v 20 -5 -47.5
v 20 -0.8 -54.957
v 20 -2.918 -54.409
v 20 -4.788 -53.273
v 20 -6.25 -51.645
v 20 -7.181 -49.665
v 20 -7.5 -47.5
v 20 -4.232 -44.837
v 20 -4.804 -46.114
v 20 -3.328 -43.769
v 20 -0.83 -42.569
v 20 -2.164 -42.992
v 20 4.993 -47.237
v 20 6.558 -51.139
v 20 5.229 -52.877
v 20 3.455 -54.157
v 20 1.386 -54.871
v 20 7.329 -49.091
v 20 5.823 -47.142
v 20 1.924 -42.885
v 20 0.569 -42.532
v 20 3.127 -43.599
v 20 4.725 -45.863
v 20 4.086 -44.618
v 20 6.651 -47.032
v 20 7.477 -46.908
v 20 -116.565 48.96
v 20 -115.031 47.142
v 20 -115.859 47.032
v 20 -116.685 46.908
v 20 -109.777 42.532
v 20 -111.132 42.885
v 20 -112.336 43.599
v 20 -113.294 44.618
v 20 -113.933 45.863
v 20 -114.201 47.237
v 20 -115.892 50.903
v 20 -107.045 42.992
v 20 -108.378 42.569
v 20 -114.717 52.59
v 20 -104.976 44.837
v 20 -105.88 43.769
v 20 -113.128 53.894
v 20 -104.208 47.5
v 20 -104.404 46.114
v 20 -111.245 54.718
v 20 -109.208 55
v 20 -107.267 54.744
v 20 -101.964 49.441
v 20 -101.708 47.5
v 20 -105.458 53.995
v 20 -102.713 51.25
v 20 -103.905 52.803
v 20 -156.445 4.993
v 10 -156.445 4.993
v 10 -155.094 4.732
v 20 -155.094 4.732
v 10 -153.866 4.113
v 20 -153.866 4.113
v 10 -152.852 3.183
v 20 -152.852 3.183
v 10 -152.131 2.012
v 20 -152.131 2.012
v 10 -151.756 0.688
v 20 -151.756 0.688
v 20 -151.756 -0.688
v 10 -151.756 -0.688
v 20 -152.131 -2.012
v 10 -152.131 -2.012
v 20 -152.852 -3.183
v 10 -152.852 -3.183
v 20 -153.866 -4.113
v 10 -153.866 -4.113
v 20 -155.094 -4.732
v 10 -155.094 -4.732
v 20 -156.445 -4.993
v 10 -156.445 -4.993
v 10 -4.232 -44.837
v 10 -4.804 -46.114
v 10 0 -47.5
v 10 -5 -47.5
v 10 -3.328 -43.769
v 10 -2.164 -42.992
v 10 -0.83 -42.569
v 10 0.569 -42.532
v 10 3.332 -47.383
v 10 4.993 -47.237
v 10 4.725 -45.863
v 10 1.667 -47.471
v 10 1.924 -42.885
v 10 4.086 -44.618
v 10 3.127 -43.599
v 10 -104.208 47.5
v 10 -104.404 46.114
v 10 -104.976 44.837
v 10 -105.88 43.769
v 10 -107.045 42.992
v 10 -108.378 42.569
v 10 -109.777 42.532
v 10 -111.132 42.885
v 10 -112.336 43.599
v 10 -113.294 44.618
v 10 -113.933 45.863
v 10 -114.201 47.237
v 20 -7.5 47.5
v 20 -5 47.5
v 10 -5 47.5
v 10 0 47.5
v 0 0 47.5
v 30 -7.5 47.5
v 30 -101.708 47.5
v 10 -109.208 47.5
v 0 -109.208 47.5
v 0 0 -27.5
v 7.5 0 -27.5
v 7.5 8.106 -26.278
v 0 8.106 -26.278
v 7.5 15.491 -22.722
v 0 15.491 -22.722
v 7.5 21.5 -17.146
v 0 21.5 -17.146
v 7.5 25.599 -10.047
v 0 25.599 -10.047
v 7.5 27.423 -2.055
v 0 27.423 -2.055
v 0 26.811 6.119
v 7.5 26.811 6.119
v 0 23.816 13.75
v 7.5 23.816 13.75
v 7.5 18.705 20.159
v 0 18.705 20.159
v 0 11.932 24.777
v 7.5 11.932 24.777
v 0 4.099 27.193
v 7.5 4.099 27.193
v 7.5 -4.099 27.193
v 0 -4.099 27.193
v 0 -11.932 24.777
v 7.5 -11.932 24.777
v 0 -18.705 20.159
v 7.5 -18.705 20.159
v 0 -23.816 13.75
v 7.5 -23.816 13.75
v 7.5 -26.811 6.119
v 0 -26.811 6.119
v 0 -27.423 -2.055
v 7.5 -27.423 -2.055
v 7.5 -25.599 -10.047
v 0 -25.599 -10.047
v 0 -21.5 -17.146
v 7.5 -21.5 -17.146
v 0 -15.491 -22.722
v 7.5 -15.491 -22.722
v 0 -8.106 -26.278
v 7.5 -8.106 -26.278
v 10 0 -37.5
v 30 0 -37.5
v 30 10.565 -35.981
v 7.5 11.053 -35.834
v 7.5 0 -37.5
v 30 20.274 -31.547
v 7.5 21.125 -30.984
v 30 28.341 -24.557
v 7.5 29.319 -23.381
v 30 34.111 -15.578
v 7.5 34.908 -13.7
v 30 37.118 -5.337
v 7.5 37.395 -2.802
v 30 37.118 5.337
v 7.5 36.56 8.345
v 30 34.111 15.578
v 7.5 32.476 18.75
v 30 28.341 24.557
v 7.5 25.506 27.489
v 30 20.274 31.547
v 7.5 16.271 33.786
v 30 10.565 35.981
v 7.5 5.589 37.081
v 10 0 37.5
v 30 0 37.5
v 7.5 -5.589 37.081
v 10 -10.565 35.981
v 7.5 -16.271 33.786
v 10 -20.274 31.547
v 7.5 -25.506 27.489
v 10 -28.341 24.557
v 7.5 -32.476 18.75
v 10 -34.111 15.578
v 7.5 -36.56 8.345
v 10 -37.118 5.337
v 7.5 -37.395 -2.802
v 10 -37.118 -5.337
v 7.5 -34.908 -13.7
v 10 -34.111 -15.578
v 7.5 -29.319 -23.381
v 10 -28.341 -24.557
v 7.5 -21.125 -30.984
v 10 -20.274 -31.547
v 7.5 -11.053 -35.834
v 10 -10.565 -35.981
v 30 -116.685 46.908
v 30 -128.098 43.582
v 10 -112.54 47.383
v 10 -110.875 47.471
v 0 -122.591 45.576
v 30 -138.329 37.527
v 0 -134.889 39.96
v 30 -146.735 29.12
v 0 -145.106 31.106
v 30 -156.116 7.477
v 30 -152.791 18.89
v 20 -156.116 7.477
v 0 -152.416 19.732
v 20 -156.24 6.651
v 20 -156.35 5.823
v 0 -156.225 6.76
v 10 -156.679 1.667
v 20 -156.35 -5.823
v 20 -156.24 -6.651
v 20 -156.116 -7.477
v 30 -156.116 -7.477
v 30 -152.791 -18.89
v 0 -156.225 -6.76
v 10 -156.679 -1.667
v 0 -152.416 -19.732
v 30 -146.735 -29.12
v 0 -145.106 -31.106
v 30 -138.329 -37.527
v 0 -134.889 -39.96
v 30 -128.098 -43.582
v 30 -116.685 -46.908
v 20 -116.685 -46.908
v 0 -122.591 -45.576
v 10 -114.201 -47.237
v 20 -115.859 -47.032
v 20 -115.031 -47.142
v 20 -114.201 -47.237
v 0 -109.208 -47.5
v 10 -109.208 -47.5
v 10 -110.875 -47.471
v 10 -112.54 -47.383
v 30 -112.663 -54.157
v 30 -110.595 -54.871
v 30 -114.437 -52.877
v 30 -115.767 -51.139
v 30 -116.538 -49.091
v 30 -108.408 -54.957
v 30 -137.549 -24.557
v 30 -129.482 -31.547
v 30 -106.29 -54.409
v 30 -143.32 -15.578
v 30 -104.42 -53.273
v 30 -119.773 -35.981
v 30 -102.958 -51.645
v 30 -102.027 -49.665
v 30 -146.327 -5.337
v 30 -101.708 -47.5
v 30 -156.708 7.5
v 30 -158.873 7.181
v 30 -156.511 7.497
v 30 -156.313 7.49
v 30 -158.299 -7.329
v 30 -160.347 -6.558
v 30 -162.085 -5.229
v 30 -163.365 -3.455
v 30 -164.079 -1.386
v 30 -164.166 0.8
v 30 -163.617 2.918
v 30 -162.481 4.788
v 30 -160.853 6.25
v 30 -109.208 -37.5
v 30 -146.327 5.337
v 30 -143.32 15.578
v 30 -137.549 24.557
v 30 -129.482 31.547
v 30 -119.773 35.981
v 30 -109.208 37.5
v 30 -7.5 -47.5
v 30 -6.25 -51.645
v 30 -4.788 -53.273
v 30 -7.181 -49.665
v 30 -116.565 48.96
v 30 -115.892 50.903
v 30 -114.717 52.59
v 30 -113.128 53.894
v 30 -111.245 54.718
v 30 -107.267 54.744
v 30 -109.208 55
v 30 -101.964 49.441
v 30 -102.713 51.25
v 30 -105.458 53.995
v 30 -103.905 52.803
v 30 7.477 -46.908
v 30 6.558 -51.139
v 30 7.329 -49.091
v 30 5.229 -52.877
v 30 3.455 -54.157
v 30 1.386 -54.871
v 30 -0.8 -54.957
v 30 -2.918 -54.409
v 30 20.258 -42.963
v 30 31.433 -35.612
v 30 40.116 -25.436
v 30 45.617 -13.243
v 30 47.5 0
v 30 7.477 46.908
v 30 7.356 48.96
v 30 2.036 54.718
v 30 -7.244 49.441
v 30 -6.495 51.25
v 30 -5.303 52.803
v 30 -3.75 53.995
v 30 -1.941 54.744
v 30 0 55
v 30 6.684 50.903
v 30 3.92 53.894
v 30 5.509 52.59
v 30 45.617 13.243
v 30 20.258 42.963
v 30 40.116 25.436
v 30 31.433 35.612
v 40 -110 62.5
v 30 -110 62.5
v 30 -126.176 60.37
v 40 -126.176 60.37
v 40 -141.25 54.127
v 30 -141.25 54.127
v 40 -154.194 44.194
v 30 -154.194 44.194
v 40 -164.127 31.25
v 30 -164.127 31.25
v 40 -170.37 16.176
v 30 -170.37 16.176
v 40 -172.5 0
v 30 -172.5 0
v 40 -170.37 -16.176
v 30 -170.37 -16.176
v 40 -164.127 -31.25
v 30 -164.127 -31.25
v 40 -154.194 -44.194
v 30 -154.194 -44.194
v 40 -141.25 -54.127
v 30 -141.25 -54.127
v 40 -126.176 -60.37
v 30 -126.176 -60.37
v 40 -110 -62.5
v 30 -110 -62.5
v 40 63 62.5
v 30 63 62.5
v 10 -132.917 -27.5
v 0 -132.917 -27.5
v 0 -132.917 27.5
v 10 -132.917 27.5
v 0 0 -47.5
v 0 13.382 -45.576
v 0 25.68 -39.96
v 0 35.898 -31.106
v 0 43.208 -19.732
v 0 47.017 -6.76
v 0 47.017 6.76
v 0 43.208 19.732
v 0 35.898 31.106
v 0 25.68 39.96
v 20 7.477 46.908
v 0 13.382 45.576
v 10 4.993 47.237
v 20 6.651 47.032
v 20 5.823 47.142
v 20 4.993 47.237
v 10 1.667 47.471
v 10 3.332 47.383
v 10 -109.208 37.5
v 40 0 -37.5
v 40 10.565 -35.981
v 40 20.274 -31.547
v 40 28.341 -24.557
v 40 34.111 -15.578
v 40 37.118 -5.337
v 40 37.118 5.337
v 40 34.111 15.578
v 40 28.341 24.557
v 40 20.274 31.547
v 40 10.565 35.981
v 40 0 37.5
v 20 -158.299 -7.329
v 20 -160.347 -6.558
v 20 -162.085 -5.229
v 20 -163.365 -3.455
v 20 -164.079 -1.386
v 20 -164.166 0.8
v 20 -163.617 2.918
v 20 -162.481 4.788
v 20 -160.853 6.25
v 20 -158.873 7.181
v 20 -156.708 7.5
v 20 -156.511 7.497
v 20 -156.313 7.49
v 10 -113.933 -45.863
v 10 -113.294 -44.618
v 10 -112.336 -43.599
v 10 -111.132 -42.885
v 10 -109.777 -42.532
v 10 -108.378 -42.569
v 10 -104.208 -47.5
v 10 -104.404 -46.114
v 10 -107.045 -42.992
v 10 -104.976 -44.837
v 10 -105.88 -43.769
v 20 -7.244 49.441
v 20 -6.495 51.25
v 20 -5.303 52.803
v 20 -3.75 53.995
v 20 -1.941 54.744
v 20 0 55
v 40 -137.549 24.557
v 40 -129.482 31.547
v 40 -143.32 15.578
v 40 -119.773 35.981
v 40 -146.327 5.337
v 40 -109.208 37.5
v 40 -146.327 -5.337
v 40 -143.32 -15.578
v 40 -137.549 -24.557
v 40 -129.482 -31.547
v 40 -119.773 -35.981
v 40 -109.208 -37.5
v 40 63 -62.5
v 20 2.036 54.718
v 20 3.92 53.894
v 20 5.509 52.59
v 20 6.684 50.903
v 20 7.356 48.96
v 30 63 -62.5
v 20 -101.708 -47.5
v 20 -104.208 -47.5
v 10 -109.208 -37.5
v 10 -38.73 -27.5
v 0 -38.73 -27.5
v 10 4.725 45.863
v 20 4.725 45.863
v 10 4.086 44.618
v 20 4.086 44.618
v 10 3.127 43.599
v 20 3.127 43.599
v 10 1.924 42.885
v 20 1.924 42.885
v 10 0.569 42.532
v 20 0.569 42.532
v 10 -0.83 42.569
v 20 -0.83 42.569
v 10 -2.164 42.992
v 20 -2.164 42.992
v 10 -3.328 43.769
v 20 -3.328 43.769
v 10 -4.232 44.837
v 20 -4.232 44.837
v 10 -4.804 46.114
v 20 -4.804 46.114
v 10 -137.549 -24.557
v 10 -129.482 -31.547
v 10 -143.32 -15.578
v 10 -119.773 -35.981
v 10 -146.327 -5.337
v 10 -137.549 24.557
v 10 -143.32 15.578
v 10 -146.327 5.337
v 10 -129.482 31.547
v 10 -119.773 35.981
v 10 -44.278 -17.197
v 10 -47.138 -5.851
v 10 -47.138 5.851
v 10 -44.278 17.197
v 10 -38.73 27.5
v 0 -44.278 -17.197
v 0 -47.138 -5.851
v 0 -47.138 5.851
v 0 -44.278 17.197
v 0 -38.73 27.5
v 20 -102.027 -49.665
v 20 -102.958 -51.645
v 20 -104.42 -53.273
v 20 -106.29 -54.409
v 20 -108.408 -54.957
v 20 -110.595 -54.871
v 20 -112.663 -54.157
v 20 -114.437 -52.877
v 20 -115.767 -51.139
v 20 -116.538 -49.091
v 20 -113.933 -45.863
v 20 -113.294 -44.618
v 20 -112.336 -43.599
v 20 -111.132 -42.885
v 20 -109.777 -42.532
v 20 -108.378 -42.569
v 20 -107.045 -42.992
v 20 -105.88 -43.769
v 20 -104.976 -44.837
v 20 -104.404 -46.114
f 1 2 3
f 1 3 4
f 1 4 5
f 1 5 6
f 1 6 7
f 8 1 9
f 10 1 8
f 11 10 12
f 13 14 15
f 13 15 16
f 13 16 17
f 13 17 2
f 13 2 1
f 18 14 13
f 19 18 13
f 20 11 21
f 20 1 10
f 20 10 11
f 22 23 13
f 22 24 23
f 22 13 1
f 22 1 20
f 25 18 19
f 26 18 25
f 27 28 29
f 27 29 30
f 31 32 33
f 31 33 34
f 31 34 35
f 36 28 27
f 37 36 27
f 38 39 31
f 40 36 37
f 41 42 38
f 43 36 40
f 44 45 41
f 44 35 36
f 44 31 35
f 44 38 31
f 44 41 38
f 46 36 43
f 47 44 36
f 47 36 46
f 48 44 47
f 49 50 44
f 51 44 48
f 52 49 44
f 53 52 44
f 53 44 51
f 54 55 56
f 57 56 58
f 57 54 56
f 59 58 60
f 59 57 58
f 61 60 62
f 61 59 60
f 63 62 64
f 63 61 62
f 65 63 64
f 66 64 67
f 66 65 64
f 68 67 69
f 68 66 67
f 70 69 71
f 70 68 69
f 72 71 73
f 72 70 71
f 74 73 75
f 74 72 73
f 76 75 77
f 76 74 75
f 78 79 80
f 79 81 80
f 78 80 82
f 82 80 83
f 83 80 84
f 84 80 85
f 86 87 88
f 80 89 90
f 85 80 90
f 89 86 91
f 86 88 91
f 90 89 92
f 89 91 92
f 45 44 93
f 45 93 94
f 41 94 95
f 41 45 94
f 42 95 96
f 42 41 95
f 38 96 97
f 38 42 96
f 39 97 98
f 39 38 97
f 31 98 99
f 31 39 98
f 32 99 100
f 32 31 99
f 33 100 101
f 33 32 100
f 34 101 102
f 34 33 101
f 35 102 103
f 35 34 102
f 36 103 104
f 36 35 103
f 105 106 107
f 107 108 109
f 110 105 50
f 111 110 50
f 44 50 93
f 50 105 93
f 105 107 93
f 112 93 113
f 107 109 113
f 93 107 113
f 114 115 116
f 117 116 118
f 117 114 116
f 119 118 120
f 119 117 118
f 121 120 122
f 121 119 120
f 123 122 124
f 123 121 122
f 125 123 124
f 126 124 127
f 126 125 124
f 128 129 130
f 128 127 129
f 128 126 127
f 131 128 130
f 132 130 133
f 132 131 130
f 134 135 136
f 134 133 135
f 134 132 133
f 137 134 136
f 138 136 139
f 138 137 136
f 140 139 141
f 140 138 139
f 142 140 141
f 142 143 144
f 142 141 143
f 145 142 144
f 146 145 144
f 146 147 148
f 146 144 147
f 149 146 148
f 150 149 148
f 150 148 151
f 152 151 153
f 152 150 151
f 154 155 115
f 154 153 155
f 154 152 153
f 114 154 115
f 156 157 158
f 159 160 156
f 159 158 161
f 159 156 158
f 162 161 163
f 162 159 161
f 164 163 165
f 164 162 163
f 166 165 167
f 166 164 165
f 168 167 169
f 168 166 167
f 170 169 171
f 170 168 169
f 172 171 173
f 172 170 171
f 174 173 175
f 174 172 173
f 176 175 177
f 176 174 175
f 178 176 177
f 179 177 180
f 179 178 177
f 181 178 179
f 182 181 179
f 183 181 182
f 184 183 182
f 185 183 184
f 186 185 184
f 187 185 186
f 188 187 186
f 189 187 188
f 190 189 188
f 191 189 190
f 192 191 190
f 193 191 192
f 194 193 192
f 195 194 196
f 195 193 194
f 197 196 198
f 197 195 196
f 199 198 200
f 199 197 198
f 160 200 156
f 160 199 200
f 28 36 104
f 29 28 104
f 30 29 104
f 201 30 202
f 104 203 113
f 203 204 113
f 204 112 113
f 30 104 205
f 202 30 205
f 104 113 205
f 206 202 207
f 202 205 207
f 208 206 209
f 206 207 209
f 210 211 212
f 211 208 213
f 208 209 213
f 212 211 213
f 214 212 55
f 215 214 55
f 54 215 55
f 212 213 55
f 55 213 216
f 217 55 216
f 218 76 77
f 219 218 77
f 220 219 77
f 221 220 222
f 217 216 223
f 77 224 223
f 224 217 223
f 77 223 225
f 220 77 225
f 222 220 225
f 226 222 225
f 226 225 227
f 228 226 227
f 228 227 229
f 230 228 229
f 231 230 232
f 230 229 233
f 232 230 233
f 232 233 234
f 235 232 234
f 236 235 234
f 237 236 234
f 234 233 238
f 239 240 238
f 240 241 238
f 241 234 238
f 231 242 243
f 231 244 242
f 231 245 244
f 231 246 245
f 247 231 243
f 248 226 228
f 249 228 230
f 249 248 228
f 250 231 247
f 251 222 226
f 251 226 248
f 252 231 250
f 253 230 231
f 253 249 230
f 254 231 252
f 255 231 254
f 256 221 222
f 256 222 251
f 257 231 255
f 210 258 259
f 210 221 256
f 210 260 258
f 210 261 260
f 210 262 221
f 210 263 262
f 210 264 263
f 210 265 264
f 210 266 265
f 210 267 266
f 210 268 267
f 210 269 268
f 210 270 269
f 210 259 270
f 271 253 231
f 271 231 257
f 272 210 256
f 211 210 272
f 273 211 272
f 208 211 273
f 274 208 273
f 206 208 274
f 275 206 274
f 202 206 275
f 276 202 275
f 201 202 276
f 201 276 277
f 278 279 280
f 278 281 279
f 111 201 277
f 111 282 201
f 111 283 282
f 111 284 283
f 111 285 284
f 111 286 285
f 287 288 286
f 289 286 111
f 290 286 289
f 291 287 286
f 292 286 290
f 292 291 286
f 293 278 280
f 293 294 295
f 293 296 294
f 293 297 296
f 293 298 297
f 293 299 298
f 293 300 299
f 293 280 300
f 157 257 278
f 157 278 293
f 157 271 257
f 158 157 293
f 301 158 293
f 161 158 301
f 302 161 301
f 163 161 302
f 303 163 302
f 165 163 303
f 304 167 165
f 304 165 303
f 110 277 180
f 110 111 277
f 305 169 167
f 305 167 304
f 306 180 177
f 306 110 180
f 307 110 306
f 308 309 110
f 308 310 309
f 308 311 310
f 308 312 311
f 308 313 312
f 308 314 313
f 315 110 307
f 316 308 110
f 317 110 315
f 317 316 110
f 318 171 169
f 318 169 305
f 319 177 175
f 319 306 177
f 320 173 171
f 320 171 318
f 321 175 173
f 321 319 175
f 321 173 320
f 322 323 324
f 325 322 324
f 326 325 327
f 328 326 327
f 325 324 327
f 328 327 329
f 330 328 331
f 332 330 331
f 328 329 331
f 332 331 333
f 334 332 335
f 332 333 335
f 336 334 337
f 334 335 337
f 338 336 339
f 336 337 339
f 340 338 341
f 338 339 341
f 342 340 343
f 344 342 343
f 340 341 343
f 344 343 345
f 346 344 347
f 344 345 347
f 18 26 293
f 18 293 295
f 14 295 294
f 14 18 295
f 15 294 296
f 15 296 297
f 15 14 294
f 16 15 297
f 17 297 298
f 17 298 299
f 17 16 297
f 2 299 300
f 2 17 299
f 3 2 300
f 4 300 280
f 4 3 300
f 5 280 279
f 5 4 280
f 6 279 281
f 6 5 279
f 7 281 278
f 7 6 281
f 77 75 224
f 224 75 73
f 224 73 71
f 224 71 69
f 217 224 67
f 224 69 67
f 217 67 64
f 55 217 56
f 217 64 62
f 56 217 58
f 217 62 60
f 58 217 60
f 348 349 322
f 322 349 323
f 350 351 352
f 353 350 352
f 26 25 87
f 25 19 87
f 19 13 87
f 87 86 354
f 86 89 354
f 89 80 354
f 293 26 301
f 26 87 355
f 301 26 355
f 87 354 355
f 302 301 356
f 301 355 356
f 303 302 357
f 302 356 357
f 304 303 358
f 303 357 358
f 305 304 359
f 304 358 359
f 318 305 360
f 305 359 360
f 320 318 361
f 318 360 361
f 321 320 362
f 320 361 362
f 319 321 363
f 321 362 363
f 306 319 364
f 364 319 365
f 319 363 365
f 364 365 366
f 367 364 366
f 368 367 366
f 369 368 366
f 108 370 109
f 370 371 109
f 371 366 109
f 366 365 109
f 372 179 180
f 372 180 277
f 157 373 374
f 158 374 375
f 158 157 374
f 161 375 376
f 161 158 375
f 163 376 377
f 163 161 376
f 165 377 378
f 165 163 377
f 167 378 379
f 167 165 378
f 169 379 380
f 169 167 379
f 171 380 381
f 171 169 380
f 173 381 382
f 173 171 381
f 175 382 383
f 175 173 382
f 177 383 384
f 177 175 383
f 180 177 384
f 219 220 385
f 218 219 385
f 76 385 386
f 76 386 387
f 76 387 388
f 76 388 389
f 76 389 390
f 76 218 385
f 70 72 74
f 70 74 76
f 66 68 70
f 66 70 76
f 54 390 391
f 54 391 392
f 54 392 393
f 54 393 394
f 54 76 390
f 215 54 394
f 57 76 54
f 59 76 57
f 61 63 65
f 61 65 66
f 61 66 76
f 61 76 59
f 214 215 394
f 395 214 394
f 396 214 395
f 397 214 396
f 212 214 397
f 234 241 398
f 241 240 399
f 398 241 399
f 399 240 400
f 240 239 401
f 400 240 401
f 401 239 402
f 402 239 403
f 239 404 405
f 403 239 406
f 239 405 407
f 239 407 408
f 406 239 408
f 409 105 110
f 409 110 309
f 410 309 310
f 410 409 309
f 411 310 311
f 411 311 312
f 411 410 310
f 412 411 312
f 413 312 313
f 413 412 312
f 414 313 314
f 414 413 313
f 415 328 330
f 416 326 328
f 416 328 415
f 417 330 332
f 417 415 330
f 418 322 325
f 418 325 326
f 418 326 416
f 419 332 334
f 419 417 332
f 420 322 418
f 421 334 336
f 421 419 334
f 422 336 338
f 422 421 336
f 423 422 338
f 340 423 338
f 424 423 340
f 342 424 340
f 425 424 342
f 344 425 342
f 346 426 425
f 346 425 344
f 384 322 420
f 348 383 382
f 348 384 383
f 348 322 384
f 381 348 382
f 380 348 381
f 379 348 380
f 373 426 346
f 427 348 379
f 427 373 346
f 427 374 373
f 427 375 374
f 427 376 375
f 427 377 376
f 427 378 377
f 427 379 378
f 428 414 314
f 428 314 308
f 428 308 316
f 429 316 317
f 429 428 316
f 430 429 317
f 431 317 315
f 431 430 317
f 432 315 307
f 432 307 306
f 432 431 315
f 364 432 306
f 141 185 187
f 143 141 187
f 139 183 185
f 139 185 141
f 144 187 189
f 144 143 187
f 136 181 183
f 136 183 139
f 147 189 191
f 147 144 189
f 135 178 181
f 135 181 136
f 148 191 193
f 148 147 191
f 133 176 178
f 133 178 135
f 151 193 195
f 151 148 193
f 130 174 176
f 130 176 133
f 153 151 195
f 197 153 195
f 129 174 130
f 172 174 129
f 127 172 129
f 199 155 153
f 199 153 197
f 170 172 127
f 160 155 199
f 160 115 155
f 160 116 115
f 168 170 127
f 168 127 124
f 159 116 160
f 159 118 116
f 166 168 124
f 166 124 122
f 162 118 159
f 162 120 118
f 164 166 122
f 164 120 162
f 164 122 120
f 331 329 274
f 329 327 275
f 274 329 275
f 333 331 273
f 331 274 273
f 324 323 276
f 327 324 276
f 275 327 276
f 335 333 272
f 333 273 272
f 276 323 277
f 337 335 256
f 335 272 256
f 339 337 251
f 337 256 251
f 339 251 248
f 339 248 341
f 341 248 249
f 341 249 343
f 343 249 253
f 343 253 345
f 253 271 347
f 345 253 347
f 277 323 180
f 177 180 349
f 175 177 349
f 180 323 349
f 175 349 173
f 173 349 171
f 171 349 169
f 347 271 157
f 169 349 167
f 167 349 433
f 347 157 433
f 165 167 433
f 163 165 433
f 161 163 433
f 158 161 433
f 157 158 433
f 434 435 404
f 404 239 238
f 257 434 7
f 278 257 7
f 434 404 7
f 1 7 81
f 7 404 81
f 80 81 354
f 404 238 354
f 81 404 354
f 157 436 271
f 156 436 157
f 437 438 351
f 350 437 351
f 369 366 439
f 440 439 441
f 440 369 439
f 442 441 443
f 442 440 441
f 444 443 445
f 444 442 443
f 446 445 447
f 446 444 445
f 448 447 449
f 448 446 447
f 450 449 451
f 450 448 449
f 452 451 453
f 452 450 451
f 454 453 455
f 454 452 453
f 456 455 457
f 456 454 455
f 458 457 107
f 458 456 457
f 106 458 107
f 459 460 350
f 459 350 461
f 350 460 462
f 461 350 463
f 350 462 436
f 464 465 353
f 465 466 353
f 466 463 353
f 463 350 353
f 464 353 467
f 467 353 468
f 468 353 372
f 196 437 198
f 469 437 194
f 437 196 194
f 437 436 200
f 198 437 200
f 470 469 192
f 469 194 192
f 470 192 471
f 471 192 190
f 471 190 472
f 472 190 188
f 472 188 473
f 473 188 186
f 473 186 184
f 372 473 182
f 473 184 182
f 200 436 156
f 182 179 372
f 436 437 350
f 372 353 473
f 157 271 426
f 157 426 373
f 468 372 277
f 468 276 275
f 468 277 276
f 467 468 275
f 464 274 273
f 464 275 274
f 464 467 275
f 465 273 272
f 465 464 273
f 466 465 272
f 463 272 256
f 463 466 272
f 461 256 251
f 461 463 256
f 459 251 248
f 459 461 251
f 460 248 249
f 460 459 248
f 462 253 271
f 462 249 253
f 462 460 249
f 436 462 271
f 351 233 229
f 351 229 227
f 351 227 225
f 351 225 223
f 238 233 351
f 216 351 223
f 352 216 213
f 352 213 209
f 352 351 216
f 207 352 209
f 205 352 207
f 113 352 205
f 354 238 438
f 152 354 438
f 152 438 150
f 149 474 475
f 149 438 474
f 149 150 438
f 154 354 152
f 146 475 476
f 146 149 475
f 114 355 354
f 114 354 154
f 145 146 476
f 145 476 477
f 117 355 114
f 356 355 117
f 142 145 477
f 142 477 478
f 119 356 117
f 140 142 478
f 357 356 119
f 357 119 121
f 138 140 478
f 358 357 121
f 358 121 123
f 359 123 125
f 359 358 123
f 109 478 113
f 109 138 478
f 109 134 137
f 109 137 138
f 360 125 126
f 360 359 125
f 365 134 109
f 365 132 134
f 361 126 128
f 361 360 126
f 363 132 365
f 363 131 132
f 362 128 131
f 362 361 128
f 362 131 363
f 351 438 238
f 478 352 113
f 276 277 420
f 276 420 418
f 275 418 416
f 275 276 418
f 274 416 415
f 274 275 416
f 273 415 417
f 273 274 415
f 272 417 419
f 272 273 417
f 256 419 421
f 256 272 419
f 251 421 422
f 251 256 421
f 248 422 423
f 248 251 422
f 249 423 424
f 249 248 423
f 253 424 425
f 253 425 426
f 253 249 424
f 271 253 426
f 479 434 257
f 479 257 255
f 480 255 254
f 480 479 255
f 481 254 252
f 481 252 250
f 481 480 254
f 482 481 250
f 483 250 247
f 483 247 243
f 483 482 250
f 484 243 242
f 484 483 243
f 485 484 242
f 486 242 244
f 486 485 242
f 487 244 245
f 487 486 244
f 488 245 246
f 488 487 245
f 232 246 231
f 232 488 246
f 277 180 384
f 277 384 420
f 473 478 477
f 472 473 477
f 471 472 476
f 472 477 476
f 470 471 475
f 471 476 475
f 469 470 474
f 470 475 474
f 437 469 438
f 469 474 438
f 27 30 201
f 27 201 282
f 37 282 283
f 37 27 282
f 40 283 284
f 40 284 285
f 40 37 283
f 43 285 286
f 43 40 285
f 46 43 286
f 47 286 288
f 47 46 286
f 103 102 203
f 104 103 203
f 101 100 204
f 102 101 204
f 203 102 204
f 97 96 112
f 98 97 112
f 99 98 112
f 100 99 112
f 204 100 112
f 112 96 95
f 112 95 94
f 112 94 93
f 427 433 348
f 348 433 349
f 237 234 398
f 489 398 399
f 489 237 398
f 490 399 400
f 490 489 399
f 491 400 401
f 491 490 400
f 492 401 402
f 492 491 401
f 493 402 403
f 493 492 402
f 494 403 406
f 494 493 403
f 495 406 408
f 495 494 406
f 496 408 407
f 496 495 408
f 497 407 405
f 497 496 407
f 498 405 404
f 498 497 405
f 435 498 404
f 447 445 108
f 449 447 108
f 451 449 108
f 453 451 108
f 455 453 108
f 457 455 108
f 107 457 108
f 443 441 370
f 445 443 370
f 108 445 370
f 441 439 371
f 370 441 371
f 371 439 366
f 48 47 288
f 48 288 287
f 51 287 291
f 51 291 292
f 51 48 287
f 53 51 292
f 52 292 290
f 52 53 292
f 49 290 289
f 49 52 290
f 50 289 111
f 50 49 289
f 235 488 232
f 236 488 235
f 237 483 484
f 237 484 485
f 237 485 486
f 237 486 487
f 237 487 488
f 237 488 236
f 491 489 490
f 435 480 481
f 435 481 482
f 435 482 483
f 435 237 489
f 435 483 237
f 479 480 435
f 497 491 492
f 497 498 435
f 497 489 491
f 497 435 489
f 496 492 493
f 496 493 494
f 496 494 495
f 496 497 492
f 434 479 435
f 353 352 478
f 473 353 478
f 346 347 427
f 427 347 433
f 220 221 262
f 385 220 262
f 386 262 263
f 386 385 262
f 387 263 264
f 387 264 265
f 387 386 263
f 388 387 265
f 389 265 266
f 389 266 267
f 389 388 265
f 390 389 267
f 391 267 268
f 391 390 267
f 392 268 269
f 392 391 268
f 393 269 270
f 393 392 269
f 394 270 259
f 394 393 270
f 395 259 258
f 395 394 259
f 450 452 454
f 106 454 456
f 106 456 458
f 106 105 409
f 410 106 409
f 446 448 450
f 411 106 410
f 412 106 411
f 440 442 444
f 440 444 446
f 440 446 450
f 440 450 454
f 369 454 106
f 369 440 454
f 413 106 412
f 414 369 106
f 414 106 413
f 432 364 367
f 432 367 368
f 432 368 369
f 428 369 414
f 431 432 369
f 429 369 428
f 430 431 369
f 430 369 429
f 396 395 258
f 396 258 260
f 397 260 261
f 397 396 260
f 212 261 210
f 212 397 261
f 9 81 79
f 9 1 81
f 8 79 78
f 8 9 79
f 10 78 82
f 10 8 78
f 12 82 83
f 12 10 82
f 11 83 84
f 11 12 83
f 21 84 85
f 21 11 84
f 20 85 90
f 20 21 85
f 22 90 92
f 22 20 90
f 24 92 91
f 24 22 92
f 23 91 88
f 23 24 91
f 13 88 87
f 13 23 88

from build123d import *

# Parameters (mm, degrees)
SKETCH1_R           = 27.5
BOSS_EXTRUDE1_DEPTH = 10
BOSS_EXTRUDE2_DEPTH = 30
BOSS_EXTRUDE4_START = -10
BOSS_EXTRUDE4_DEPTH = 10
CUT_EXTRUDE1_START  = -2.5
SKETCH7_R           = 37.5
SKETCH7_R_2         = 27.25
CUT_EXTRUDE1_DEPTH  = 2.5
BOSS_EXTRUDE5_START = 10
BOSS_EXTRUDE5_DEPTH = 10
SKETCH9_R           = 5
CUT_EXTRUDE2_DEPTH  = 10


# Read off the part's stored shape, not the designer's step: Split1
with BuildPart() as part:
    # Sketch1 → Boss-Extrude1 (new body)
    with BuildSketch(Plane(origin=(0, 0, 0), x_dir=(0, 0, -1), z_dir=(1, 0, 0))):
        with BuildLine():
            Line((47.5, 0), (47.5, -109.208308594))
            ThreePointArc((47.5, -109.208308594), (0, -156.708308594), (-47.5, -109.208308594))
            Line((-47.5, -109.208308594), (-47.5, 0))
            ThreePointArc((-47.5, 0), (0, 47.5), (47.5, 0))
        make_face()
        Circle(SKETCH1_R, mode=Mode.SUBTRACT)
        with BuildLine():
            Line((27.5, -38.729833462), (27.5, -132.916779119))
            Line((27.5, -132.916779119), (-27.5, -132.916779119))
            Line((-27.5, -132.916779119), (-27.5, -38.729833462))
            ThreePointArc((-27.5, -38.729833462), (0, -47.5), (27.5, -38.729833462))
        make_face(mode=Mode.SUBTRACT)
    extrude(amount=BOSS_EXTRUDE1_DEPTH)

    # Sketch2 → Boss-Extrude2 (add)
    with BuildSketch(Plane(origin=(10, 0, 0), x_dir=(0, 0, -1), z_dir=(1, 0, 0))):
        with BuildLine():
            Line((-47.5, 0), (-47.5, -109.208308594))
            ThreePointArc((-47.5, -109.208308594), (0, -156.708308594), (47.5, -109.208308594))
            Line((47.5, -109.208308594), (47.5, 0))
            ThreePointArc((47.5, 0), (0, 47.5), (-47.5, 0))
        make_face()
        with BuildLine():
            Line((37.5, -109.208308594), (37.5, 0))
            ThreePointArc((37.5, 0), (0, 37.5), (-37.5, 0))
            Line((-37.5, 0), (-37.5, -109.208308594))
            ThreePointArc((-37.5, -109.208308594), (0, -146.708308594), (37.5, -109.208308594))
        make_face(mode=Mode.SUBTRACT)
    extrude(amount=BOSS_EXTRUDE2_DEPTH)

    # Sketch4 → Boss-Extrude4 (add)
    with BuildSketch(Plane(origin=(40, 0, 0), x_dir=(0, 0, -1), z_dir=(1, 0, 0)).offset(BOSS_EXTRUDE4_START)):
        with BuildLine():
            Line((62.5, -110), (62.5, 63))
            Line((62.5, 63), (-62.5, 63))
            Line((-62.5, 63), (-62.5, -110))
            ThreePointArc((-62.5, -110), (0, -172.5), (62.5, -110))
        make_face()
        with BuildLine():
            Line((-47.5, -109.208308594), (-47.5, 0))
            ThreePointArc((-47.5, 0), (0, 47.5), (47.5, 0))
            Line((47.5, 0), (47.5, -109.208308594))
            ThreePointArc((47.5, -109.208308594), (0, -156.708308594), (-47.5, -109.208308594))
        make_face(mode=Mode.SUBTRACT)
    extrude(amount=BOSS_EXTRUDE4_DEPTH)

    # Sketch7 → Cut-Extrude1 (cut)
    with BuildSketch(Plane(origin=(10, 0, 0), x_dir=(0, 0, -1), z_dir=(1, 0, 0)).offset(CUT_EXTRUDE1_START)):
        Circle(SKETCH7_R)
        Circle(SKETCH7_R_2, mode=Mode.SUBTRACT)
    extrude(amount=CUT_EXTRUDE1_DEPTH, mode=Mode.SUBTRACT)

    # Sketch8 → Boss-Extrude5 (add)
    with BuildSketch(Plane.ZY.offset(-30).offset(BOSS_EXTRUDE5_START)):
        with BuildLine():
            ThreePointArc((-47.5, -101.708308594), (-54.994145438, -109.504592507), (-46.907894737, -116.684899485))
            ThreePointArc((-46.907894737, -116.684899485), (-47.351742312, -112.958308594), (-47.5, -109.208308594))
            Line((-47.5, -109.208308594), (-47.5, -101.708308594))
        make_face()
        with BuildLine():
            ThreePointArc((7.5, -156.708308594), (7.494145438, -156.41202468), (7.476590891, -156.11620333))
            ThreePointArc((7.476590891, -156.11620333), (0, -156.708308594), (-7.476590891, -156.11620333))
            ThreePointArc((-7.476590891, -156.11620333), (-0.296283913, -164.202454031), (7.5, -156.708308594))
        make_face()
        with BuildLine():
            Line((47.5, -101.708308594), (47.5, -109.208308594))
            ThreePointArc((47.5, -109.208308594), (47.351742312, -112.958308594), (46.907894737, -116.684899485))
            ThreePointArc((46.907894737, -116.684899485), (52.589656694, -114.716974016), (55, -109.208308594))
            ThreePointArc((55, -109.208308594), (52.803300859, -103.905007735), (47.5, -101.708308594))
        make_face()
        with BuildLine():
            Line((47.5, 0), (47.5, -7.5))
            ThreePointArc((47.5, -7.5), (52.803300859, -5.303300859), (55, 0))
            ThreePointArc((55, 0), (52.589656694, 5.508665422), (46.907894737, 7.476590891))
            ThreePointArc((46.907894737, 7.476590891), (47.351742312, 3.75), (47.5, 0))
        make_face()
        with BuildLine():
            ThreePointArc((-47.5, 0), (-47.351742312, 3.75), (-46.907894737, 7.476590891))
            ThreePointArc((-46.907894737, 7.476590891), (-54.994145438, 0.296283913), (-47.5, -7.5))
            Line((-47.5, -7.5), (-47.5, 0))
        make_face()
        with BuildLine():
            ThreePointArc((-40, 0), (-41.991334578, 5.089656694), (-46.907894737, 7.476590891))
            ThreePointArc((-46.907894737, 7.476590891), (-47.351742312, 3.75), (-47.5, 0))
            Line((-47.5, 0), (-47.5, -7.5))
            ThreePointArc((-47.5, -7.5), (-42.196699141, -5.303300859), (-40, 0))
        make_face()
    extrude(amount=-BOSS_EXTRUDE5_DEPTH)

    # Sketch9 → Cut-Extrude2 (cut)
    with BuildSketch(Plane.ZY.offset(-20)):
        with Locations((0, -156.708308594)):
            Circle(SKETCH9_R)
        with Locations((47.5, -109.208308594)):
            Circle(SKETCH9_R)
        with Locations((47.5, 0)):
            Circle(SKETCH9_R)
        with Locations((-47.5, 0)):
            Circle(SKETCH9_R)
        with Locations((-47.5, -109.208308594)):
            Circle(SKETCH9_R)
    extrude(amount=CUT_EXTRUDE2_DEPTH, mode=Mode.SUBTRACT)


with BuildPart() as body_2:
    # Split1: the piece on the far side of the plane
    add(part.part)
    split(bisect_by=Plane.YZ.offset(30), keep=Keep.BOTTOM)


with BuildPart() as part_1:
    add(part.part)

    # Split1
    split(bisect_by=Plane.YZ.offset(30), keep=Keep.TOP)


solid = Compound([body_2.part, part_1.part])
